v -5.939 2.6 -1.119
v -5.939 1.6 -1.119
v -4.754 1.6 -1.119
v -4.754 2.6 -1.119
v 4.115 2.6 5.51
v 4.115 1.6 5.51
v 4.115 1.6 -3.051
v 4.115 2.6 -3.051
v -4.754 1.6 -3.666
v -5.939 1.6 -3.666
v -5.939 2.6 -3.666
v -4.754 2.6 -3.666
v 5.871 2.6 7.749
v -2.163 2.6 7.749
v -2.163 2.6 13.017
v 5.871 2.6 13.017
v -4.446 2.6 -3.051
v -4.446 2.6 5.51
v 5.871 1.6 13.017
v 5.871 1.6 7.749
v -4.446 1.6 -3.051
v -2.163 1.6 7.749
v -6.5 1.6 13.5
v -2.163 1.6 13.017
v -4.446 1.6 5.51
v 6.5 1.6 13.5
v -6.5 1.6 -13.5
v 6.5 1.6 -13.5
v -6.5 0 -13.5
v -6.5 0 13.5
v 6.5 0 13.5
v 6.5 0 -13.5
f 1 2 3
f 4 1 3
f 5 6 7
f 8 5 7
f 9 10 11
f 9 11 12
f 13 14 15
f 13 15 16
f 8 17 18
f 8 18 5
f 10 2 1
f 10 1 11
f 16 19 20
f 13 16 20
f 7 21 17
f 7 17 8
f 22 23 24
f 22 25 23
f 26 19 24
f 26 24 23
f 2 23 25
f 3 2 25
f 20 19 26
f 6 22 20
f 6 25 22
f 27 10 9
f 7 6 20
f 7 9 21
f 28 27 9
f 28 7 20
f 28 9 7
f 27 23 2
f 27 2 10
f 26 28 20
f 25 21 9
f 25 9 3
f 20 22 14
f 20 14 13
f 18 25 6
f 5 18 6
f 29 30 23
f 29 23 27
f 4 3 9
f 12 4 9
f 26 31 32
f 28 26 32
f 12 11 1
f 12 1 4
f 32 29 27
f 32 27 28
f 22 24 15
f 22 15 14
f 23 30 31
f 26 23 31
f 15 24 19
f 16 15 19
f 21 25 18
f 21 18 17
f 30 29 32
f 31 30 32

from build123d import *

# Parameters (mm, degrees)
SKETCH_1_W      = 13
SKETCH_1_H      = 27
EXTRUDE_1_DEPTH = 1.6
SKETCH_2_W      = 8.033918408
SKETCH_2_H      = 5.268143219
SKETCH_2_W_2    = 8.560732729
SKETCH_2_H_2    = 8.56073273
SKETCH_2_W_3    = 1.185332224
SKETCH_2_H_3    = 2.546269222
EXTRUDE_2_DEPTH = 1


with BuildPart() as part:
    # 草图1 → 凸台-拉伸1 (new body)
    with BuildSketch(Plane(origin=(0, 0, 0), x_dir=(1, 0, 0), z_dir=(0, 1, 0))):
        Rectangle(SKETCH_1_W, SKETCH_1_H)
    extrude(amount=EXTRUDE_1_DEPTH)

    # 草图2 → 凸台-拉伸2 (add)
    with BuildSketch(Plane(origin=(0, 1.6, 0), x_dir=(1, 0, 0), z_dir=(0, 1, 0))):
        with Locations((1.853625196, -10.38263226)):
            Rectangle(SKETCH_2_W, SKETCH_2_H)
        with Locations((-0.165829704, -1.229233418)):
            Rectangle(SKETCH_2_W_2, SKETCH_2_H_2)
        with Locations((-5.346170536, 2.392615045)):
            Rectangle(SKETCH_2_W_3, SKETCH_2_H_3)
    extrude(amount=EXTRUDE_2_DEPTH)


solid = part.part
